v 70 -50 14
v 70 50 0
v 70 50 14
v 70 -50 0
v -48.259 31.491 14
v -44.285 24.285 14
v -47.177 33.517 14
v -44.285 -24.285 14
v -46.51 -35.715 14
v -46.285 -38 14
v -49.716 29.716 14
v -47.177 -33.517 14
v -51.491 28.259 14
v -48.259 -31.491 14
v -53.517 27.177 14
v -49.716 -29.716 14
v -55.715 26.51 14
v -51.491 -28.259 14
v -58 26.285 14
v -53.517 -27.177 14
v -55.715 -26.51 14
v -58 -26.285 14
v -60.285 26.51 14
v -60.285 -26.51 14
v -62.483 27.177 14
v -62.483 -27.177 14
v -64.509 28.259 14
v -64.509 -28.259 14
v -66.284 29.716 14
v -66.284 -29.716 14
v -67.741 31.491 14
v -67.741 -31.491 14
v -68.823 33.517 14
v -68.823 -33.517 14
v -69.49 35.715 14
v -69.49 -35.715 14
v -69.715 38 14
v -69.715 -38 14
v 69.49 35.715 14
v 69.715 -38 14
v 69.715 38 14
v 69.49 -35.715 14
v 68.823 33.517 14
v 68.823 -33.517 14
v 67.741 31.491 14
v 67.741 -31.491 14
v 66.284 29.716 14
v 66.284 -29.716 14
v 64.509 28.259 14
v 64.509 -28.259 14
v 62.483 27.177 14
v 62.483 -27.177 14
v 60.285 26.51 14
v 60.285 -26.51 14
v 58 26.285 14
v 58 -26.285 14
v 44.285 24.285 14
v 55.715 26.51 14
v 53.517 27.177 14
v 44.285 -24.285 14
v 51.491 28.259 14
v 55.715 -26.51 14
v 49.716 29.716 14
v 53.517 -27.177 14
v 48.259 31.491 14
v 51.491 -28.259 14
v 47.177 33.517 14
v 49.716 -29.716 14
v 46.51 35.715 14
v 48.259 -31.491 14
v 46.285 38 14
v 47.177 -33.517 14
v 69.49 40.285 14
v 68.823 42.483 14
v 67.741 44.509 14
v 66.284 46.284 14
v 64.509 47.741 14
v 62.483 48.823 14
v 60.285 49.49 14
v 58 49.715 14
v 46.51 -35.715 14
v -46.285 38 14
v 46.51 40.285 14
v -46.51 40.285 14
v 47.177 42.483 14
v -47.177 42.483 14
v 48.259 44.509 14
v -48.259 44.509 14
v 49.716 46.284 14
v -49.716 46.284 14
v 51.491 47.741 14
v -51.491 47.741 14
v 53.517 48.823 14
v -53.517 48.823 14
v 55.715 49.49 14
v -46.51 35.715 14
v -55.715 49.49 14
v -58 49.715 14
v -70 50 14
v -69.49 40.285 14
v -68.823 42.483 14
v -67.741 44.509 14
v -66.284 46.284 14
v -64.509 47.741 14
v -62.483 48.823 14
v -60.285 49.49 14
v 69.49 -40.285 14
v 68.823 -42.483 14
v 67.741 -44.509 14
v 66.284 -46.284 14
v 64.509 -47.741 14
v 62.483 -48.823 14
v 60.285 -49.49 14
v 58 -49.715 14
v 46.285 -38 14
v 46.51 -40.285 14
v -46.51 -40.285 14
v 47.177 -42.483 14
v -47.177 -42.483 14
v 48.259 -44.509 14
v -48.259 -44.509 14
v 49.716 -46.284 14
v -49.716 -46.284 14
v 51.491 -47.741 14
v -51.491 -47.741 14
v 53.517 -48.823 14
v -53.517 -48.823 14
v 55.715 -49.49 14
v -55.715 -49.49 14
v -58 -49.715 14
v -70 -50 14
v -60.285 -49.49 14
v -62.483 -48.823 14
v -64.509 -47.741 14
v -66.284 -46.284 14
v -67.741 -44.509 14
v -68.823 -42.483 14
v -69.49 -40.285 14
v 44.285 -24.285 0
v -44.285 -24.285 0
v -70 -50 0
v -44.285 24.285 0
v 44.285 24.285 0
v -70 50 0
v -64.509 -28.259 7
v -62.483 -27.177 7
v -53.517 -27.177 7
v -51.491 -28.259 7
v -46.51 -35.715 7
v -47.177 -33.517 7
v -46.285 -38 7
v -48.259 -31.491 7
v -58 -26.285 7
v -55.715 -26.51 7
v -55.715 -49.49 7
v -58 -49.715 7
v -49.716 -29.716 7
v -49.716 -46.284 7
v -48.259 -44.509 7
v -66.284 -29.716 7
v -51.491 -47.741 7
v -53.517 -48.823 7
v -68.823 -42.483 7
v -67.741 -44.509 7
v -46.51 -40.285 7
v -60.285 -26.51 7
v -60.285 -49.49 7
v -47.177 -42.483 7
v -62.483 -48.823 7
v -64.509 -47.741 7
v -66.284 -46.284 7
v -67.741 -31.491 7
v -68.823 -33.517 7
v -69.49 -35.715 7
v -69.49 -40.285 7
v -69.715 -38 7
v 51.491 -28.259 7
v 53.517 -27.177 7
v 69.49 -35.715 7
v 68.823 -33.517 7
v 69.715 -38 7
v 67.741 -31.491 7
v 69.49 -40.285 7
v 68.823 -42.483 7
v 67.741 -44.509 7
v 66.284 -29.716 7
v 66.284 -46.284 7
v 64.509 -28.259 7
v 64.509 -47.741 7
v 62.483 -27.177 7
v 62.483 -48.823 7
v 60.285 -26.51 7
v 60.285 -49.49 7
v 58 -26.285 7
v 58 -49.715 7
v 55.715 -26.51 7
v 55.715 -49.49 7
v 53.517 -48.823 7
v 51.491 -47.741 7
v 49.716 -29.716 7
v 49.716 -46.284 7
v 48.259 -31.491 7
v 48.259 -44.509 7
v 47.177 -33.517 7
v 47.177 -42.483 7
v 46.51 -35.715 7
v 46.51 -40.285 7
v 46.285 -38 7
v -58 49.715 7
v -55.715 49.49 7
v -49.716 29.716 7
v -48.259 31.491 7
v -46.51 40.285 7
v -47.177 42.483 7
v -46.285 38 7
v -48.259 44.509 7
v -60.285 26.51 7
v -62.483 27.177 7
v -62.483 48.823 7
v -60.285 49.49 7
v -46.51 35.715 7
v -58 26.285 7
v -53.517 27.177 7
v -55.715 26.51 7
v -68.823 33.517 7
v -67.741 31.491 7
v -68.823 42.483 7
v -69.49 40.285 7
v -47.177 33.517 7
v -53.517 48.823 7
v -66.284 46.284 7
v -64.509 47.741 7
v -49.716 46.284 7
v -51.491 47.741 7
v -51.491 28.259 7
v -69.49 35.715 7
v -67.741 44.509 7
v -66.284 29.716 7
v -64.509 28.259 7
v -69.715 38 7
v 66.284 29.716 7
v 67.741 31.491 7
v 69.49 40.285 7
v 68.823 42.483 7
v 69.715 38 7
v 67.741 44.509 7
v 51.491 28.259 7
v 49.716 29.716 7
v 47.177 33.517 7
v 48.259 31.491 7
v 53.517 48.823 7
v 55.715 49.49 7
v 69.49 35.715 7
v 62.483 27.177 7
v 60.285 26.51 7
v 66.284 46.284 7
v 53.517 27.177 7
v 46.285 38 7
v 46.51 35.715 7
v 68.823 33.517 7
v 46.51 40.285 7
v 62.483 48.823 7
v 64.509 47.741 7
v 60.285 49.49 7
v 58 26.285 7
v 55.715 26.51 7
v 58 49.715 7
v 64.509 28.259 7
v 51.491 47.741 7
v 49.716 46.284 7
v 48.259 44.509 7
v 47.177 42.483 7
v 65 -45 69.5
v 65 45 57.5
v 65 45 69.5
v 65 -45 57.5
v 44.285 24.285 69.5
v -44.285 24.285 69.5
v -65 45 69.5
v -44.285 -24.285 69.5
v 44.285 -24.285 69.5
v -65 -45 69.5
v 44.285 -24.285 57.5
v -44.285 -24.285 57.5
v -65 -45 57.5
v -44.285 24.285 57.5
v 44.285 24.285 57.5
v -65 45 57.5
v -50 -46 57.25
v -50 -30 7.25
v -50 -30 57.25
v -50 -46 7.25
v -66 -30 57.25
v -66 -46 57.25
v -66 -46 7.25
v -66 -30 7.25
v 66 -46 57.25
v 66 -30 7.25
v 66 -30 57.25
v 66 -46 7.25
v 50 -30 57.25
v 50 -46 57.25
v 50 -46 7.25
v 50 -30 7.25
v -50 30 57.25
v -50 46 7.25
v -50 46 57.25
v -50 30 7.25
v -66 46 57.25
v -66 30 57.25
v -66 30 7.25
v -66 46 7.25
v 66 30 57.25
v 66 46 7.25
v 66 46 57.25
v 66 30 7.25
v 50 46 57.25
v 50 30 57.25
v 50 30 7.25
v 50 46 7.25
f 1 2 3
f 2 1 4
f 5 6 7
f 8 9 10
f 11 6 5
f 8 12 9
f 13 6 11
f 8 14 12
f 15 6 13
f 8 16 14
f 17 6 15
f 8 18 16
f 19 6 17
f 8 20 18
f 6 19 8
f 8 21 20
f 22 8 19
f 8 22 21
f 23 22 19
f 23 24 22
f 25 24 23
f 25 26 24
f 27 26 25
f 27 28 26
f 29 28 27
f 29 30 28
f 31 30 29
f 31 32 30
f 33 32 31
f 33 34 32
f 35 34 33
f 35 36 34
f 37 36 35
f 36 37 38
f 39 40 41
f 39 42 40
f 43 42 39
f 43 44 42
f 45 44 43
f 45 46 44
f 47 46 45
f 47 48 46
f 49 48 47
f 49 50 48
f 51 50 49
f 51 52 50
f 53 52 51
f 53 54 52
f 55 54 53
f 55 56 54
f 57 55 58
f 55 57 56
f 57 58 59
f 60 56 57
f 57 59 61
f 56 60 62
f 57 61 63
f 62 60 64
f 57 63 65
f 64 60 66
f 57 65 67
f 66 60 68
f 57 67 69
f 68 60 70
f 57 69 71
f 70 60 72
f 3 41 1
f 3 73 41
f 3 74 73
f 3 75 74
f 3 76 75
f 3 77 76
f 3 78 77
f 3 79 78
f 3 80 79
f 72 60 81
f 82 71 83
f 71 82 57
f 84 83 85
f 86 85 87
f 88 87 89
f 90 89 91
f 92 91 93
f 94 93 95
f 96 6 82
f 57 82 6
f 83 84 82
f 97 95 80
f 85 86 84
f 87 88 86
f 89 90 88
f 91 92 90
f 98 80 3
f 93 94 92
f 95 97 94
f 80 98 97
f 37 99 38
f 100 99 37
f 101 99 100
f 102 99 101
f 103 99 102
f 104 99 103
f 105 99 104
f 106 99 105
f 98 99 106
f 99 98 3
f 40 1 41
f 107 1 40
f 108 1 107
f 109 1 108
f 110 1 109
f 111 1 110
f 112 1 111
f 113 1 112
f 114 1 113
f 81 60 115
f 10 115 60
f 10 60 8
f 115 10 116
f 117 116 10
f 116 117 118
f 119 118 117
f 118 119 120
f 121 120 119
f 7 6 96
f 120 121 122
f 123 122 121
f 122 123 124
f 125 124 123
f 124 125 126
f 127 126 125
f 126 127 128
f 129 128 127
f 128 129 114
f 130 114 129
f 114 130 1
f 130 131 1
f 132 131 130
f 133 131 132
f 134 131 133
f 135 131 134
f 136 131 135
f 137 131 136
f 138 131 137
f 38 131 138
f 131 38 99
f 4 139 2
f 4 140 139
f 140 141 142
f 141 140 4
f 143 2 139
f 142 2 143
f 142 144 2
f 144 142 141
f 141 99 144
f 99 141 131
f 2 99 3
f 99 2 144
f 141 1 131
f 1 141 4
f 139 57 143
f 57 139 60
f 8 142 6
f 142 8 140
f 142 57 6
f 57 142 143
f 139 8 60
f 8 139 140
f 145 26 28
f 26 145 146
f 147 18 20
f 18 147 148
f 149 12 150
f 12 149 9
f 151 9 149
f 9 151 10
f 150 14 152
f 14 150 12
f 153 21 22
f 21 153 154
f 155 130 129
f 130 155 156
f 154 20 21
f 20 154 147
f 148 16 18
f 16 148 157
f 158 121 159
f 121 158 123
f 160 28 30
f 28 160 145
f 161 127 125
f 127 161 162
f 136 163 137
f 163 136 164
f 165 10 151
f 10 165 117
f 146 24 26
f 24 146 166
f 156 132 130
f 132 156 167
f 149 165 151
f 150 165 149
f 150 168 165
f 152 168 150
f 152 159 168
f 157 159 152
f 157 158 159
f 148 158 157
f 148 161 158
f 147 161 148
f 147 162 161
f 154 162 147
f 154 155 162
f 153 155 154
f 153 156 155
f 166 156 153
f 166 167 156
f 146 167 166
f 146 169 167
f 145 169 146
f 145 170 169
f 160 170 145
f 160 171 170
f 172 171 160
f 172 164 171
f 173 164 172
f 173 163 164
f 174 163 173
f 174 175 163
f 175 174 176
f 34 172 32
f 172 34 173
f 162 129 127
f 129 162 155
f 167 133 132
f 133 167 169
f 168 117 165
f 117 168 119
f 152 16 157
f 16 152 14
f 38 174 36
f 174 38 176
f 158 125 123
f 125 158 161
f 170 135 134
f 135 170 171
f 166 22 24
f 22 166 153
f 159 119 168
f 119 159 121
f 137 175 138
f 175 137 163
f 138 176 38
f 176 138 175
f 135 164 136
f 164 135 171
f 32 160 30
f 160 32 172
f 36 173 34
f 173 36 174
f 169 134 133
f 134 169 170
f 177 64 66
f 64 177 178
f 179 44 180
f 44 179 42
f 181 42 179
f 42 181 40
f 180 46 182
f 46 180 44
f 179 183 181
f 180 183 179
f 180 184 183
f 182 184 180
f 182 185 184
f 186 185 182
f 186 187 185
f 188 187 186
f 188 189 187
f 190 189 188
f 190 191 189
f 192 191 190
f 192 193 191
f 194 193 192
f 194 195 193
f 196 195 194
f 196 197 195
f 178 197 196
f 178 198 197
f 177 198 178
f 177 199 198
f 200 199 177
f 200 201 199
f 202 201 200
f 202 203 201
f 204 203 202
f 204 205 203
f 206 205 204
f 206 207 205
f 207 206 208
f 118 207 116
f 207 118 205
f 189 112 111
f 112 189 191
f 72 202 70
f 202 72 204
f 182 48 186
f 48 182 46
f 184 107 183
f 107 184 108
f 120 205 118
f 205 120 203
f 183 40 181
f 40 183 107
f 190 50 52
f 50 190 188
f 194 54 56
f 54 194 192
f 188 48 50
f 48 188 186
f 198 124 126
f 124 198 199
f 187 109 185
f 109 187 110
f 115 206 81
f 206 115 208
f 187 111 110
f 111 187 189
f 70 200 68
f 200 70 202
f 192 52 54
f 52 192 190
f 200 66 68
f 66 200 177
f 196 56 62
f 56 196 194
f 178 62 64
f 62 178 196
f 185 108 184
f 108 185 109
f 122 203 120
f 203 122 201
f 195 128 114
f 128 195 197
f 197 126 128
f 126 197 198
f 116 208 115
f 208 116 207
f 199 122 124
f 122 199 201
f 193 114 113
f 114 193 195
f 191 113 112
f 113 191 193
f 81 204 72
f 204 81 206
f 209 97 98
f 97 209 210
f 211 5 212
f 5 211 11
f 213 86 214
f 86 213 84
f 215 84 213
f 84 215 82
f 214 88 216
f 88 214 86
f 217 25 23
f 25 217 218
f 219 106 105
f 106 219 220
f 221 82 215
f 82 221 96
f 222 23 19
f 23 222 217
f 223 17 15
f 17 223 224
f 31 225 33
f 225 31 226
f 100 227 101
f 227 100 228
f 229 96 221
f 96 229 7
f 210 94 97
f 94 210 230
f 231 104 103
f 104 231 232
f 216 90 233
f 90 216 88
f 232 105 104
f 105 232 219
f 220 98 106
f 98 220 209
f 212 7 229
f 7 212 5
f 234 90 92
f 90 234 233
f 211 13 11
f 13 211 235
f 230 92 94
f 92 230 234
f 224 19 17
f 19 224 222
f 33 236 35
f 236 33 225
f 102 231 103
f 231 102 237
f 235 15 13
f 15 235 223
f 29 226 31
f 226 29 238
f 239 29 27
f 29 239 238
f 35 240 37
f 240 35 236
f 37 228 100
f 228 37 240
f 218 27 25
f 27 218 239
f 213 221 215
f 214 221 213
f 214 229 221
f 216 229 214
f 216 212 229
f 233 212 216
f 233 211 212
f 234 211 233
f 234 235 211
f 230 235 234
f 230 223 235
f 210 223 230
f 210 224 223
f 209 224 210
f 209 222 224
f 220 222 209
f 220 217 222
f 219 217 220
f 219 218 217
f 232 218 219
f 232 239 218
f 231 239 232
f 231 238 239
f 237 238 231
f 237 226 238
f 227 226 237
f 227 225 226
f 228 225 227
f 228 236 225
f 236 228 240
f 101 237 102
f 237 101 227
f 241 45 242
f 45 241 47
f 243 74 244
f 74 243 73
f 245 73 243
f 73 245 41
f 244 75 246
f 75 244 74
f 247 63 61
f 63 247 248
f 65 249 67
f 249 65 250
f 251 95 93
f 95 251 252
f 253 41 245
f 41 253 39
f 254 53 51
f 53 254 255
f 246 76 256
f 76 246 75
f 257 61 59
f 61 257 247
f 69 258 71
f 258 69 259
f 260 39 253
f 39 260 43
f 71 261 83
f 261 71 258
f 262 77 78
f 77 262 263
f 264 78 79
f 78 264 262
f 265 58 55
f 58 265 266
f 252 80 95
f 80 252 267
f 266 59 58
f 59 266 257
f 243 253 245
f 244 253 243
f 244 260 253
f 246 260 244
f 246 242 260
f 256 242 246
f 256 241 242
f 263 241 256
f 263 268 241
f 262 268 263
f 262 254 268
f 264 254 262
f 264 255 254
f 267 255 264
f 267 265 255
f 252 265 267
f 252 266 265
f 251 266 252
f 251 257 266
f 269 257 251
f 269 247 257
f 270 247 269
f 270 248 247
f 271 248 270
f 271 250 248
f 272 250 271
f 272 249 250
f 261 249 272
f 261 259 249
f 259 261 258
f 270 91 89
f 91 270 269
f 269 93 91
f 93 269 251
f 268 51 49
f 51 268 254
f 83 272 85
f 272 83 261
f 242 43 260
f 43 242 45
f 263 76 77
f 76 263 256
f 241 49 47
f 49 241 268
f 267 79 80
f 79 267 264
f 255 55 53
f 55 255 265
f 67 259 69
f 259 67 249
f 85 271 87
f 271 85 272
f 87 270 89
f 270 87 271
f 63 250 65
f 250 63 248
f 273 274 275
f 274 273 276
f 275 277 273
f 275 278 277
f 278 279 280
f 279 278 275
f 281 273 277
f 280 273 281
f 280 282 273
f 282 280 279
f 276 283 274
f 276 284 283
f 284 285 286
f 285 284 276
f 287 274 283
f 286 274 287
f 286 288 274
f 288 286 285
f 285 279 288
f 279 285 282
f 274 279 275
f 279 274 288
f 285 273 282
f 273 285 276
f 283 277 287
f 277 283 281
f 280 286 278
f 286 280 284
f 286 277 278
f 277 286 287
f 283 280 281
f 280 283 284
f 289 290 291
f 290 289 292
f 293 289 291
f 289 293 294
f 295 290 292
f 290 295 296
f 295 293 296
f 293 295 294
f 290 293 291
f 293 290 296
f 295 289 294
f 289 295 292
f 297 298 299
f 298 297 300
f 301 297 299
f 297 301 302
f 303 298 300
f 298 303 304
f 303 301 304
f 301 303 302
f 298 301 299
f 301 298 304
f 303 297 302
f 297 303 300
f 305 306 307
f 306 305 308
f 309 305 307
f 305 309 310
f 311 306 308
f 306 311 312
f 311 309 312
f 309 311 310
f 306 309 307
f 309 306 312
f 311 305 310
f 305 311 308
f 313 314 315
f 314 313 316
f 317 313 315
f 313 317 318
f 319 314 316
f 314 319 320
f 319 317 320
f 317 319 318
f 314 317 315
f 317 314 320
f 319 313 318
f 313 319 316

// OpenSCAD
$fn = 32;

// ------------------------------------------------------------------------
// Frame cube: base 140 x 100 mm, posts 50 mm tall
// Every part is its own module, assembly() places every instance.
// ------------------------------------------------------------------------

// --- part 1 ---
module base_frame() {
  difference() {
    translate([-70, -50, 0]) cube([140, 100, 14]);
    translate([-44.285, -24.285, -1]) cube([88.57, 48.57, 16]);
    translate([-58, -38, 7]) cylinder(h = 8, d = 23.43);
    translate([58, -38, 7]) cylinder(h = 8, d = 23.43);
    translate([-58, 38, 7]) cylinder(h = 8, d = 23.43);
    translate([58, 38, 7]) cylinder(h = 8, d = 23.43);
  }
}

// --- part 2 ---
module corner_post() {
  translate([-8, -8, 0]) cube([16, 16, 50]);
}

// --- part 3 ---
module top_frame() {
  difference() {
    translate([-65, -45, 0]) cube([130, 90, 12]);
    translate([-44.285, -24.285, -1]) cube([88.57, 48.57, 14]);
  }
}

// --- assembly ---
module assembly() {
  color([0.80, 0.24, 0.20]) translate([0, 0, 0]) rotate([0, 0, 0]) base_frame();
  color([0.20, 0.45, 0.75]) translate([-58, -38, 7.25]) rotate([0, 0, 0]) corner_post();
  color([0.25, 0.62, 0.32]) translate([58, -38, 7.25]) rotate([0, 0, 0]) corner_post();
  color([0.92, 0.70, 0.18]) translate([-58, 38, 7.25]) rotate([0, 0, 0]) corner_post();
  color([0.58, 0.35, 0.70]) translate([58, 38, 7.25]) rotate([0, 0, 0]) corner_post();
  color([0.16, 0.66, 0.66]) translate([0, 0, 57.5]) rotate([0, 0, 0]) top_frame();
}

assembly();
